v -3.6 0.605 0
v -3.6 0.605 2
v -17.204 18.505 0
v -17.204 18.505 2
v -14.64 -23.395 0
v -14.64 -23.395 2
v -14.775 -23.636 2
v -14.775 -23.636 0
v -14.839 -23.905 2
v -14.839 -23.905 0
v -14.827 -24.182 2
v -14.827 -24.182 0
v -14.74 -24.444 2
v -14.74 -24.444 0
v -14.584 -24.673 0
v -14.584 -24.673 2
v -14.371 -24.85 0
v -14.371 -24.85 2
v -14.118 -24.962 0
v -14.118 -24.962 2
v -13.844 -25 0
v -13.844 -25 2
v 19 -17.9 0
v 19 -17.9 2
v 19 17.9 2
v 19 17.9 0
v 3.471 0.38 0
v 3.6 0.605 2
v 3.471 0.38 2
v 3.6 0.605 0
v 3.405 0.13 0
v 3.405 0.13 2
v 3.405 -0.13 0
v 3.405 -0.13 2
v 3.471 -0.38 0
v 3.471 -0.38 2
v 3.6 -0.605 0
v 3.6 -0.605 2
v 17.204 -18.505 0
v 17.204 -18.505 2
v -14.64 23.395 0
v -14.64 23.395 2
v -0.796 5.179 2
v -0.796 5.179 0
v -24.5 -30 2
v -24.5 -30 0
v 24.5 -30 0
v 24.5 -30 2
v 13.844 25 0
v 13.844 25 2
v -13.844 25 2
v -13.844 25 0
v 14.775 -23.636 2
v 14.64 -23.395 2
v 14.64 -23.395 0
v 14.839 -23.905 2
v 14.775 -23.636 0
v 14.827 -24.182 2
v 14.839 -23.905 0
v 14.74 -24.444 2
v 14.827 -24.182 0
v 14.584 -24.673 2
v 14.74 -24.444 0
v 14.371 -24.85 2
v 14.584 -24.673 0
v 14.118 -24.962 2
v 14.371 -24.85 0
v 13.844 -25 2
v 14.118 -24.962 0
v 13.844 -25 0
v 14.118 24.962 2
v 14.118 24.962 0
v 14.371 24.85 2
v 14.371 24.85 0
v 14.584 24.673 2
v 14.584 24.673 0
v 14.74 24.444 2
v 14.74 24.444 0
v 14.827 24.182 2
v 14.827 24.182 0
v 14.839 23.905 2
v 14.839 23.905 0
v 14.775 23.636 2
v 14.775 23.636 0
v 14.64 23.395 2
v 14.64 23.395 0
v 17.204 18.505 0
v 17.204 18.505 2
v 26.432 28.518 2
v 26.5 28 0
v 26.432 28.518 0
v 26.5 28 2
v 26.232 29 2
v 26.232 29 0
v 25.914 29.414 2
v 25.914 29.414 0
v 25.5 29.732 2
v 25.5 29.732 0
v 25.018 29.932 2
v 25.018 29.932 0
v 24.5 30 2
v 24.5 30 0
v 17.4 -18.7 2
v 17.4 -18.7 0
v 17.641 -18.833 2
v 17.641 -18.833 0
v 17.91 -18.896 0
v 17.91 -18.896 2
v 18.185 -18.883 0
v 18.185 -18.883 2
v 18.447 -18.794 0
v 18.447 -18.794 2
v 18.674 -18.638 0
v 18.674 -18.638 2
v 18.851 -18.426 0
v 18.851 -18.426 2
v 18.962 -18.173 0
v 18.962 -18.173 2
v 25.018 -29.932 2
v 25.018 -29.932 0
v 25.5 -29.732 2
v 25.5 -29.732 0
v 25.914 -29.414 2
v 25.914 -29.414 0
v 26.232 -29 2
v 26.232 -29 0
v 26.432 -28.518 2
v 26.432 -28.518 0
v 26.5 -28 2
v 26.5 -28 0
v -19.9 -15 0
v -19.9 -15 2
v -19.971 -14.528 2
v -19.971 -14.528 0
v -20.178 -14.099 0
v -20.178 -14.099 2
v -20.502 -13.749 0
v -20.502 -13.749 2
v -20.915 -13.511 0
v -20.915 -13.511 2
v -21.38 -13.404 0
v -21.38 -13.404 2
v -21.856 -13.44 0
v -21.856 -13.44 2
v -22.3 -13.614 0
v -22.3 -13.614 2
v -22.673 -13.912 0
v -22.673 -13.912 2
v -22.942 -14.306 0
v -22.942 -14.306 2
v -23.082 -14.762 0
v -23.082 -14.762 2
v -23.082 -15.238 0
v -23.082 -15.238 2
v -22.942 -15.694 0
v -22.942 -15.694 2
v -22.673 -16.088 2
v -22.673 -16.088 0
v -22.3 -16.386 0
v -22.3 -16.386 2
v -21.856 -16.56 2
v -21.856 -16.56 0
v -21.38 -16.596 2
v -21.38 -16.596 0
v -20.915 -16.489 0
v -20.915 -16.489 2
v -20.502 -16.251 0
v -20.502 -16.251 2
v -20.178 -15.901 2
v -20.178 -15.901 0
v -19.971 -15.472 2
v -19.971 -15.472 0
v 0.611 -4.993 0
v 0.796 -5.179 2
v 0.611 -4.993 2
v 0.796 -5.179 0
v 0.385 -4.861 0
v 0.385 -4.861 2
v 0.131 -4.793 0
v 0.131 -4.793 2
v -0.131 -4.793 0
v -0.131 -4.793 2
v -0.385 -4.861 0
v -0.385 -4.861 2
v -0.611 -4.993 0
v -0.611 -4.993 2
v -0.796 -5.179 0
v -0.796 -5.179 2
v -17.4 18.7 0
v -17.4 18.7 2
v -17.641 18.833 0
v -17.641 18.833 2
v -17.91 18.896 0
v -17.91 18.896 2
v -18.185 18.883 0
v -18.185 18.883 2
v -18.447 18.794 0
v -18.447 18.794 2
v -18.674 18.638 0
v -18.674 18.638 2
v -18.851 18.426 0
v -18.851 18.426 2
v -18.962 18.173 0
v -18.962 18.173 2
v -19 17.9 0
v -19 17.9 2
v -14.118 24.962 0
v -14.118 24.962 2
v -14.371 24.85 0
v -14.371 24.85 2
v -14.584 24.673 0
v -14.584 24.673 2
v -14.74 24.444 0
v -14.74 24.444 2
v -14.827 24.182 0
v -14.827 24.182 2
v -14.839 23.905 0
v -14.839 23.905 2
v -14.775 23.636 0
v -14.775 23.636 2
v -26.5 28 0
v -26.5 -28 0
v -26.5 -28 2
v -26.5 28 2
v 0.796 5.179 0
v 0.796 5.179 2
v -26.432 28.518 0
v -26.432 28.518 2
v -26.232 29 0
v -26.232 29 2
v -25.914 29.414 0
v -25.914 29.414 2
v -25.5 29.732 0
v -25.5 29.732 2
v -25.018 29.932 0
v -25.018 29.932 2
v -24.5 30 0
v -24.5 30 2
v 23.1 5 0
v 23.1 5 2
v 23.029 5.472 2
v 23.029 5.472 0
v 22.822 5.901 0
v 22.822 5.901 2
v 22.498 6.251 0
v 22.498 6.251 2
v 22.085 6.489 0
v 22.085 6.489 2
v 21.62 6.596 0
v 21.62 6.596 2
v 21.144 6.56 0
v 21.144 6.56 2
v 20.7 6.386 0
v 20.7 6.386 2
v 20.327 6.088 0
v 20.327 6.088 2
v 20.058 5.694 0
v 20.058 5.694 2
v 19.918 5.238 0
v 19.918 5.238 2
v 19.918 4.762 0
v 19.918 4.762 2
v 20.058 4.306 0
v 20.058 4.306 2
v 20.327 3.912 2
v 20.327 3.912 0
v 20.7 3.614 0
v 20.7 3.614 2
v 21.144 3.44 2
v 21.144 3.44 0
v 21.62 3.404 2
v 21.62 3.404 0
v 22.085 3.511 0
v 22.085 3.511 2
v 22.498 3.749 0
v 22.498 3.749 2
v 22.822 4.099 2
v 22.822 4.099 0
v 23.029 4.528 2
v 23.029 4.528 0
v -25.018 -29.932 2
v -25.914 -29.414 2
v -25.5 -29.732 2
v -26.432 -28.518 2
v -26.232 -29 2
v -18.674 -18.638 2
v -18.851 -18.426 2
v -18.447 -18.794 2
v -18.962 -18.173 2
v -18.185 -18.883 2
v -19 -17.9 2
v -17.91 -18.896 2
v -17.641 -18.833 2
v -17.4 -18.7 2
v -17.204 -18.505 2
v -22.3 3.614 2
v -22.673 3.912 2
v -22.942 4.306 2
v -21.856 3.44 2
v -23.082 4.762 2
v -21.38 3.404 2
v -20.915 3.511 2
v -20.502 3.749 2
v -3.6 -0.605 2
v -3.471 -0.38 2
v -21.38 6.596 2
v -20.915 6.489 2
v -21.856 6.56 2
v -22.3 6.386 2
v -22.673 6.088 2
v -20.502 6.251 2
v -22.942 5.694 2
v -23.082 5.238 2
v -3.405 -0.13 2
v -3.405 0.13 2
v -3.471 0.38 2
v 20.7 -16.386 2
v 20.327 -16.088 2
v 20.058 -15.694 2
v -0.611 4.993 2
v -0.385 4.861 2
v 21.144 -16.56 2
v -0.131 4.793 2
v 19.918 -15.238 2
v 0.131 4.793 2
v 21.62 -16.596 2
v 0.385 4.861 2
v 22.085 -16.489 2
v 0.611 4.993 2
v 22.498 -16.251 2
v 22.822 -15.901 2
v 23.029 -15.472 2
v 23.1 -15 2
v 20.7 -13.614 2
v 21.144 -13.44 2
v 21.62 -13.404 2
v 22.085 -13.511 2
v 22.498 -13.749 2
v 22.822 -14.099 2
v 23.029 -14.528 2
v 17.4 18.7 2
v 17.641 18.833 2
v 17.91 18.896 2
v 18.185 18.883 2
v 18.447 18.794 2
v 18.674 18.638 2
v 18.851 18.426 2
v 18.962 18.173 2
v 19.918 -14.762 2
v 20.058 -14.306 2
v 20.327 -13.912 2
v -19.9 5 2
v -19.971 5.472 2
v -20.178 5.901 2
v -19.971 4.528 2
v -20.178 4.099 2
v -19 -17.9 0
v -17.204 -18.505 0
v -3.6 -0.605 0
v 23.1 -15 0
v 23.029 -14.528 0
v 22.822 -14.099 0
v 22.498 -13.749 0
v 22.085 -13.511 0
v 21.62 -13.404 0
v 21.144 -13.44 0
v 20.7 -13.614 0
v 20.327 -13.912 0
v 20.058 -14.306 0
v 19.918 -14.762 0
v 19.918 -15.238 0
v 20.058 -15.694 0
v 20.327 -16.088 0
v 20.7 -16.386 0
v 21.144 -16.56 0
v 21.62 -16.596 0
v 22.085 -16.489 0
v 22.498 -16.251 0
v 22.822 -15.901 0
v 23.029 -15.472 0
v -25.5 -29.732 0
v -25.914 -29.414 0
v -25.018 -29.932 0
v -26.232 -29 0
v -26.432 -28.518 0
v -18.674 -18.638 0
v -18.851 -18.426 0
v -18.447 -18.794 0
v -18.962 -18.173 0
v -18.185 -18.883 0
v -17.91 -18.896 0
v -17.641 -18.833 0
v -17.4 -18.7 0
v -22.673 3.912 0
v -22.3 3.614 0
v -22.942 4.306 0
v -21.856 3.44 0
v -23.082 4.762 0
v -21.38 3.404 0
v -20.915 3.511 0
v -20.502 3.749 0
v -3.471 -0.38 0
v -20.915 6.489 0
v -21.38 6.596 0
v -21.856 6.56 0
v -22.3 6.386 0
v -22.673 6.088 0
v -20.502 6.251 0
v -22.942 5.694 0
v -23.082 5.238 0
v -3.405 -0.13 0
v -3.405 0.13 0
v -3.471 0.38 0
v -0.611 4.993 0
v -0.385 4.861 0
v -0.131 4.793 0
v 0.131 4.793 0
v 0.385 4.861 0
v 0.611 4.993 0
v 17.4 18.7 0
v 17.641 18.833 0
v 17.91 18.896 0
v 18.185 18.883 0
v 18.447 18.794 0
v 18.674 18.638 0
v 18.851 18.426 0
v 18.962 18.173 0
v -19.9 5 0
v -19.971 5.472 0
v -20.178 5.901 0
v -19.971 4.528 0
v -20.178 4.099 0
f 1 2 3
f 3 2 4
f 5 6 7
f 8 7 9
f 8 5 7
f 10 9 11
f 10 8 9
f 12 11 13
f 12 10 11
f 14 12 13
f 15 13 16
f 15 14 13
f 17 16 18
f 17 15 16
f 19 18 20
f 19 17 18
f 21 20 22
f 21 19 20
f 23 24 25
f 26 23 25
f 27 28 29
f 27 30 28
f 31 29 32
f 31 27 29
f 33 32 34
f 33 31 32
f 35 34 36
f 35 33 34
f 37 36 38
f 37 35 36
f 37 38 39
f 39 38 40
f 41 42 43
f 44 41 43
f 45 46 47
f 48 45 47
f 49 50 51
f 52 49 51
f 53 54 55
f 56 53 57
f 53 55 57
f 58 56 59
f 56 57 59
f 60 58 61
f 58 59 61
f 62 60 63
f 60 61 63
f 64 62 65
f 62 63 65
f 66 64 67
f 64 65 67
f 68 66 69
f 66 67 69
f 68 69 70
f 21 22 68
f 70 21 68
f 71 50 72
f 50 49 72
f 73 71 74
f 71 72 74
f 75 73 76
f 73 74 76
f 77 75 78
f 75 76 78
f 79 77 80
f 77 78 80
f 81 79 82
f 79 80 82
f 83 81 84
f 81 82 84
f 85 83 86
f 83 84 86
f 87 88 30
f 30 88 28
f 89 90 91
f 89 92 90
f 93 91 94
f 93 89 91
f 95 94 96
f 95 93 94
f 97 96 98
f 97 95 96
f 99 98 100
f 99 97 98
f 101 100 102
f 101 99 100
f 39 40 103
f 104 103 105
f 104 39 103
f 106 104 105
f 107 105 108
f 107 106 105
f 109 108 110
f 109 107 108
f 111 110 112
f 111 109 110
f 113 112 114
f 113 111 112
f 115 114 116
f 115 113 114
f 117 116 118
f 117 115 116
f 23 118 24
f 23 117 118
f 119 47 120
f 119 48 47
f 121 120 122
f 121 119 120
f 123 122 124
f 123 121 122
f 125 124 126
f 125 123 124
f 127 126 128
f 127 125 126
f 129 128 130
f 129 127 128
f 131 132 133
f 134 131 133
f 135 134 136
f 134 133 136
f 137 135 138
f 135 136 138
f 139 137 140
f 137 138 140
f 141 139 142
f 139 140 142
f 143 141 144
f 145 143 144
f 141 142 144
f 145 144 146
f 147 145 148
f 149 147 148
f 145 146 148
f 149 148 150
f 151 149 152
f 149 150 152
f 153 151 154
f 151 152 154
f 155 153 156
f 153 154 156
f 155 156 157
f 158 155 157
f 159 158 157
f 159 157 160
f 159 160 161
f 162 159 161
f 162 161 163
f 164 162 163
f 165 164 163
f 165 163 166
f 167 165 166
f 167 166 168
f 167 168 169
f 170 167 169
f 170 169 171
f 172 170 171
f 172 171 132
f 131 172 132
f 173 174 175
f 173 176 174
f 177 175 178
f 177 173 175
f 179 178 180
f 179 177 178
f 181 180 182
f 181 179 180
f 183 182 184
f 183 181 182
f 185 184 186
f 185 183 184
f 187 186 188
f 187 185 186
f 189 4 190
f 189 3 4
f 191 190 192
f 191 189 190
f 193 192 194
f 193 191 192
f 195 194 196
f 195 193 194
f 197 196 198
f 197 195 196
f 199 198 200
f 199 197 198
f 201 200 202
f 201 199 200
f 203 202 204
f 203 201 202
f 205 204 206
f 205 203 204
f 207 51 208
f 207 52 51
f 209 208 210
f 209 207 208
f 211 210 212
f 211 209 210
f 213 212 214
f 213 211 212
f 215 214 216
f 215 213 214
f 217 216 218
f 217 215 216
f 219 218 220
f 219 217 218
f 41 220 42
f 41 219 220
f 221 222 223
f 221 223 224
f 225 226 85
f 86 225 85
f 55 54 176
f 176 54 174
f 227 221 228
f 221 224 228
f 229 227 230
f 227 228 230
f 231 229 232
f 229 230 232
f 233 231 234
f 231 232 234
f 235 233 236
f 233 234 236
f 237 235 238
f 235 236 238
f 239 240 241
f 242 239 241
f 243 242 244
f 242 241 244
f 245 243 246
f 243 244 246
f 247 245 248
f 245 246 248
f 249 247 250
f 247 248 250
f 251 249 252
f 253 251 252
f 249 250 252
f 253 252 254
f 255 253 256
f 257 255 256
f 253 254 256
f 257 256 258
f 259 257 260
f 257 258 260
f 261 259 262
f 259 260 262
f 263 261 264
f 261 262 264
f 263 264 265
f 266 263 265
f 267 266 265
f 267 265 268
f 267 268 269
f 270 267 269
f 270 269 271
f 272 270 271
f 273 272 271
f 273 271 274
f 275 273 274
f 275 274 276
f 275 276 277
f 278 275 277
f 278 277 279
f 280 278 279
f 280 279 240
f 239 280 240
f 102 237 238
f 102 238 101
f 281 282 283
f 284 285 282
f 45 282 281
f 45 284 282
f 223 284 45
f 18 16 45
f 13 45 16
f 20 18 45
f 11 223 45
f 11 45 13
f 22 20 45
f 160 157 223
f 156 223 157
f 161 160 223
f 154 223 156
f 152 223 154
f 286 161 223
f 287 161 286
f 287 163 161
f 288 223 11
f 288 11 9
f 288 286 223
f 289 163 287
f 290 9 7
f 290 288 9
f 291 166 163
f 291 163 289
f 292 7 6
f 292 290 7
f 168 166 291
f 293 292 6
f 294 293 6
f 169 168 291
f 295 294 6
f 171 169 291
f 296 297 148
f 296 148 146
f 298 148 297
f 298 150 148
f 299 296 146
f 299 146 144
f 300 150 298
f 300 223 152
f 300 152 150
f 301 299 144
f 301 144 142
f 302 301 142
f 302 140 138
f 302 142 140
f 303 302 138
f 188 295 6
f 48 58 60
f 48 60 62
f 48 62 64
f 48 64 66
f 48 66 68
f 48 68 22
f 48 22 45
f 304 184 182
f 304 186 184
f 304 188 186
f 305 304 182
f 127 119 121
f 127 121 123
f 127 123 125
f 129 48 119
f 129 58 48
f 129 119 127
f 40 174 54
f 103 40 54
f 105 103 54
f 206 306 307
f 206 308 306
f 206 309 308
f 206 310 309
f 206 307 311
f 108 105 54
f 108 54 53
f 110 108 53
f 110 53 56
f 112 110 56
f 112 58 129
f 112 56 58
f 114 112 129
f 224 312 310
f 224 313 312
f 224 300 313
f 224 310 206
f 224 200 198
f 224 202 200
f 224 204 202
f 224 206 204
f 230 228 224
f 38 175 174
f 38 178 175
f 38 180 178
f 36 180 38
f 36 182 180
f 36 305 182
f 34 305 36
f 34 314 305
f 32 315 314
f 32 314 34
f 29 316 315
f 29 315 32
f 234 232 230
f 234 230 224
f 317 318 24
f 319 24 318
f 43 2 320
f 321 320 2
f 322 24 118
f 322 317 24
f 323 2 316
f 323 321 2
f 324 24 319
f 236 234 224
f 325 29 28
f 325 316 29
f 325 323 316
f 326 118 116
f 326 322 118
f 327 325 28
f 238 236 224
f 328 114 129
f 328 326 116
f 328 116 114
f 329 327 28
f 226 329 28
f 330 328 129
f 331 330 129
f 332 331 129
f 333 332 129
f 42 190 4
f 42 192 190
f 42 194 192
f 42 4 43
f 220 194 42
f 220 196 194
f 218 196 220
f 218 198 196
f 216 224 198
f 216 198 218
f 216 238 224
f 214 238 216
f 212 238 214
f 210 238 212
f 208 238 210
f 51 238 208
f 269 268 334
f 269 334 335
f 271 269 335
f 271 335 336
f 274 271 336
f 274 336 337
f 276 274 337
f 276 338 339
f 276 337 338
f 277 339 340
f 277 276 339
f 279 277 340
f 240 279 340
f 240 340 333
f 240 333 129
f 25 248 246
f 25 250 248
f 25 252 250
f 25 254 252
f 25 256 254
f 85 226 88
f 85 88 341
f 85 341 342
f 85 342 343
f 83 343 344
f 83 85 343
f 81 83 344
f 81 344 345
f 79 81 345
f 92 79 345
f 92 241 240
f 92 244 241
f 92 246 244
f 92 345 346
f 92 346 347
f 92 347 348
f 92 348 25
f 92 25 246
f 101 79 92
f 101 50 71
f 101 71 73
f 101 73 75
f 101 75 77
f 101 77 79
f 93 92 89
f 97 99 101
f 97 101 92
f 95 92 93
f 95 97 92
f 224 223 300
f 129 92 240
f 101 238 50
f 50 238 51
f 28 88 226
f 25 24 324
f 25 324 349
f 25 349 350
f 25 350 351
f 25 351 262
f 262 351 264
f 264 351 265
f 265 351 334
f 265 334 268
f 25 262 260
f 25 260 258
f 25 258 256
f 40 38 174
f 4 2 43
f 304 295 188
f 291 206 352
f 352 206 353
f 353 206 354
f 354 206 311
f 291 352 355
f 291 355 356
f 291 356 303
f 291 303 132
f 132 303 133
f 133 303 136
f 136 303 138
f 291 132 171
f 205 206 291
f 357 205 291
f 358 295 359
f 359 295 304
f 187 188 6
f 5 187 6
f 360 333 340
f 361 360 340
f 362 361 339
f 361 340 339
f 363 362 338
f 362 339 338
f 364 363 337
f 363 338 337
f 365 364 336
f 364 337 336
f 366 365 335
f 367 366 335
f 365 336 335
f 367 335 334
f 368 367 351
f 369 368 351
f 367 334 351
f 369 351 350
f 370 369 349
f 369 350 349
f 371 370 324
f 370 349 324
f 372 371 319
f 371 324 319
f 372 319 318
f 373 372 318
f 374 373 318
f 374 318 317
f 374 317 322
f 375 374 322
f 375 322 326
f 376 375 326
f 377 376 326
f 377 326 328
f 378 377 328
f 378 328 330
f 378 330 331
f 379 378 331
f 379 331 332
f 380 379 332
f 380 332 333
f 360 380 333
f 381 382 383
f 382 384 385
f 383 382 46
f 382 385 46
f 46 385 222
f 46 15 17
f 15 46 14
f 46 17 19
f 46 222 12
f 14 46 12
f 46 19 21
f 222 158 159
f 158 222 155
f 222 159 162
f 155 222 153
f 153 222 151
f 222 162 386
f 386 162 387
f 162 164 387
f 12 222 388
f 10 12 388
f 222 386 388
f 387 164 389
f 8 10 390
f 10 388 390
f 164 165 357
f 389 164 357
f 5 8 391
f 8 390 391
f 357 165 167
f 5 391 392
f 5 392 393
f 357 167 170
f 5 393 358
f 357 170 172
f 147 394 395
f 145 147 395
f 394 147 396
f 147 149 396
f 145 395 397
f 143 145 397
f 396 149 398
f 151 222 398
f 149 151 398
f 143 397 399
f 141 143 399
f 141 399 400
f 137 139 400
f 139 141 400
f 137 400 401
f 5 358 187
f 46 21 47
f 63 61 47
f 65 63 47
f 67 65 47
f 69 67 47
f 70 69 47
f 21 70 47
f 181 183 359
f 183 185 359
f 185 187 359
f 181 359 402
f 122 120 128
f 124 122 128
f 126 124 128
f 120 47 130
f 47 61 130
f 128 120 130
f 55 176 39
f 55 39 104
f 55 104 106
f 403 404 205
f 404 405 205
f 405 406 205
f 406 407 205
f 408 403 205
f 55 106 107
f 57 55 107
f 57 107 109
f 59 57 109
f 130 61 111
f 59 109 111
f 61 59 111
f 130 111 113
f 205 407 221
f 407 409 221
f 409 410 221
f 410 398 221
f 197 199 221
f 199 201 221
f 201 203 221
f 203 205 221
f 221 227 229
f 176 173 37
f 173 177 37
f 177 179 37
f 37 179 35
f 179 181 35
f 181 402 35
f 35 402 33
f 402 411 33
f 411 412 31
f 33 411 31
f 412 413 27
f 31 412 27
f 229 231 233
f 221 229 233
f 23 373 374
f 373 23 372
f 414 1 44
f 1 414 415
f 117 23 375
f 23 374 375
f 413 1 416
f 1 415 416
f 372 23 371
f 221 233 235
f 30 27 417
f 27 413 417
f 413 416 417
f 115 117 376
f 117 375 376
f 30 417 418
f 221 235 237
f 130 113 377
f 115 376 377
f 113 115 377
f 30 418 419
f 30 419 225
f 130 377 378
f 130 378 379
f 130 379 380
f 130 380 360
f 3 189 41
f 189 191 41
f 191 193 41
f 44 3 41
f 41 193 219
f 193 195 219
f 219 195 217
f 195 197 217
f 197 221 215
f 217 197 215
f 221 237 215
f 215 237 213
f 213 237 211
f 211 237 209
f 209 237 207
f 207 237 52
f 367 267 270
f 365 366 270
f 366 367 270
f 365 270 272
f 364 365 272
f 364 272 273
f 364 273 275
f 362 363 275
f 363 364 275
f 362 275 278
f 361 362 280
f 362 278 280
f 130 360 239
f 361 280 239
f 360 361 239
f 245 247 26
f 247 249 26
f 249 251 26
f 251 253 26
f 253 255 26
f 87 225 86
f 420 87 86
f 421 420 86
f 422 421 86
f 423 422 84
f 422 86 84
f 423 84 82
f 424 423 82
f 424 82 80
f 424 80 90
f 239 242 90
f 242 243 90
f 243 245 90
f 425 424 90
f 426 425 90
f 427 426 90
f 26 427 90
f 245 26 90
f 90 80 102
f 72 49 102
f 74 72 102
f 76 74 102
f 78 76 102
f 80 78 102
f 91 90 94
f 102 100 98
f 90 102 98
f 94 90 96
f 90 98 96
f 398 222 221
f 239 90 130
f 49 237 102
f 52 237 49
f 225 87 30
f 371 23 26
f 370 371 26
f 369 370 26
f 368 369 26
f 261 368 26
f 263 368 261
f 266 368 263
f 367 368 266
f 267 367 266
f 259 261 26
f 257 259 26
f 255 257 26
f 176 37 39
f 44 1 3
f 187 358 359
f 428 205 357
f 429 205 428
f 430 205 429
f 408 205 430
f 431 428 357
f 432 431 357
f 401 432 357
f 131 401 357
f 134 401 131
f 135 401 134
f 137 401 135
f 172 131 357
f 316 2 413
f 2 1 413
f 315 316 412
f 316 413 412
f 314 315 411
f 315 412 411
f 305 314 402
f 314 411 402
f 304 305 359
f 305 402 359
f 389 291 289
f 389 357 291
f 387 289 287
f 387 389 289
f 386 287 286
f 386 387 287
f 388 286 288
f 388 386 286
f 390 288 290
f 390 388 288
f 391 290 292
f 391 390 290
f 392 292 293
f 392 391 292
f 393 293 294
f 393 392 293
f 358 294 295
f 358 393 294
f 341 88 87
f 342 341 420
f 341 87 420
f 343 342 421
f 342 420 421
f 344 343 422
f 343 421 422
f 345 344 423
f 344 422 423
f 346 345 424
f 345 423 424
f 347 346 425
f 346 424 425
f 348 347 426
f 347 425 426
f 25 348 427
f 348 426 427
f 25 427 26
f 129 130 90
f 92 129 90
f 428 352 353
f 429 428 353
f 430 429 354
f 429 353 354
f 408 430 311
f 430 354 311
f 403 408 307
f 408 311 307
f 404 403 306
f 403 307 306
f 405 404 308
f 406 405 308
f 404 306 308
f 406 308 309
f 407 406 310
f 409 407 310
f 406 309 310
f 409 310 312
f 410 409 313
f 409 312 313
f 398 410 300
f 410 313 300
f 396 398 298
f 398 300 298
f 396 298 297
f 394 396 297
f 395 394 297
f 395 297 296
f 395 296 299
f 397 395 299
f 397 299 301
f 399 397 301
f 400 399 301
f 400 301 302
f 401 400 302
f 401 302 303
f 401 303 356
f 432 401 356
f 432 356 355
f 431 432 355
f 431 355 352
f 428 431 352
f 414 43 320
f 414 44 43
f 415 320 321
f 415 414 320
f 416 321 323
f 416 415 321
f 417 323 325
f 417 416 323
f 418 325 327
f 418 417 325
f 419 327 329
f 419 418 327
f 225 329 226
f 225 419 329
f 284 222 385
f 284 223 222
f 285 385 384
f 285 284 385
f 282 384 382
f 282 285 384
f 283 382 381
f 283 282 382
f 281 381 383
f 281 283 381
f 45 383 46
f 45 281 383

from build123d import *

# Parameters (mm, degrees)
SKETCH_1_W          = 53
SKETCH_1_H          = 60
EXTRUDE_1_DEPTH     = 2
FILLET_1_R          = 2
SKETCH_2_R          = 1.6
CUT_EXTRUDE_1_DEPTH = 41.078048855
CUT_EXTRUDE_2_DEPTH = 41.078048855
FILLET_2_R          = 1


with BuildPart() as part:
    # 草图1 → 凸台-拉伸1 (new body)
    with BuildSketch(Plane.XY):
        Rectangle(SKETCH_1_W, SKETCH_1_H)
    extrude(amount=EXTRUDE_1_DEPTH)

    # 圆角1
    fillet_1_edges = [part.edges().sort_by_distance(p)[0] for p in [
        (26.5, -30, 1),
        (-26.5, -30, 1),
        (-26.5, 30, 1),
        (26.5, 30, 1),
    ]]
    fillet(fillet_1_edges, radius=FILLET_1_R)

    # 草图2 → 切除-拉伸1 (cut, through all)
    with BuildSketch(Plane.XY.offset(2)):
        with Locations((21.5, 5)):
            Circle(SKETCH_2_R)
        with Locations((21.5, -15)):
            Circle(SKETCH_2_R)
        with Locations((-21.5, 5)):
            Circle(SKETCH_2_R)
        with Locations((-21.5, -15)):
            Circle(SKETCH_2_R)
    extrude(amount=-CUT_EXTRUDE_1_DEPTH, mode=Mode.SUBTRACT)

    # 草图3 → 切除-拉伸2 (cut, through all)
    with BuildSketch(Plane.XY.offset(2)):
        Polygon((-3.140063694, 0), (-19, 20.868337245), (-19, -20.868337245), align=None)
        Polygon((15.859936306, -25), (0, -4.131662755), (-15.859936306, -25), align=None)
        Polygon((19, 20.868337245), (3.140063694, 0), (19, -20.868337245), align=None)
        Polygon((15.859936306, 25), (-15.859936306, 25), (0, 4.131662755), align=None)
    extrude(amount=-CUT_EXTRUDE_2_DEPTH, mode=Mode.SUBTRACT)

    # 圆角2
    fillet_2_edges = [part.edges().sort_by_distance(p)[0] for p in [
        (3.140063694, 0, 1),
        (19, 20.868337245, 1),
        (19, -20.868337245, 1),
        (0, -4.131662755, 1),
        (15.859936306, -25, 1),
        (-15.859936306, -25, 1),
        (-15.859936306, 25, 1),
        (15.859936306, 25, 1),
        (0, 4.131662755, 1),
        (-19, 20.868337245, 1),
        (-3.140063694, 0, 1),
        (-19, -20.868337245, 1),
    ]]
    fillet(fillet_2_edges, radius=FILLET_2_R)


solid = part.part
